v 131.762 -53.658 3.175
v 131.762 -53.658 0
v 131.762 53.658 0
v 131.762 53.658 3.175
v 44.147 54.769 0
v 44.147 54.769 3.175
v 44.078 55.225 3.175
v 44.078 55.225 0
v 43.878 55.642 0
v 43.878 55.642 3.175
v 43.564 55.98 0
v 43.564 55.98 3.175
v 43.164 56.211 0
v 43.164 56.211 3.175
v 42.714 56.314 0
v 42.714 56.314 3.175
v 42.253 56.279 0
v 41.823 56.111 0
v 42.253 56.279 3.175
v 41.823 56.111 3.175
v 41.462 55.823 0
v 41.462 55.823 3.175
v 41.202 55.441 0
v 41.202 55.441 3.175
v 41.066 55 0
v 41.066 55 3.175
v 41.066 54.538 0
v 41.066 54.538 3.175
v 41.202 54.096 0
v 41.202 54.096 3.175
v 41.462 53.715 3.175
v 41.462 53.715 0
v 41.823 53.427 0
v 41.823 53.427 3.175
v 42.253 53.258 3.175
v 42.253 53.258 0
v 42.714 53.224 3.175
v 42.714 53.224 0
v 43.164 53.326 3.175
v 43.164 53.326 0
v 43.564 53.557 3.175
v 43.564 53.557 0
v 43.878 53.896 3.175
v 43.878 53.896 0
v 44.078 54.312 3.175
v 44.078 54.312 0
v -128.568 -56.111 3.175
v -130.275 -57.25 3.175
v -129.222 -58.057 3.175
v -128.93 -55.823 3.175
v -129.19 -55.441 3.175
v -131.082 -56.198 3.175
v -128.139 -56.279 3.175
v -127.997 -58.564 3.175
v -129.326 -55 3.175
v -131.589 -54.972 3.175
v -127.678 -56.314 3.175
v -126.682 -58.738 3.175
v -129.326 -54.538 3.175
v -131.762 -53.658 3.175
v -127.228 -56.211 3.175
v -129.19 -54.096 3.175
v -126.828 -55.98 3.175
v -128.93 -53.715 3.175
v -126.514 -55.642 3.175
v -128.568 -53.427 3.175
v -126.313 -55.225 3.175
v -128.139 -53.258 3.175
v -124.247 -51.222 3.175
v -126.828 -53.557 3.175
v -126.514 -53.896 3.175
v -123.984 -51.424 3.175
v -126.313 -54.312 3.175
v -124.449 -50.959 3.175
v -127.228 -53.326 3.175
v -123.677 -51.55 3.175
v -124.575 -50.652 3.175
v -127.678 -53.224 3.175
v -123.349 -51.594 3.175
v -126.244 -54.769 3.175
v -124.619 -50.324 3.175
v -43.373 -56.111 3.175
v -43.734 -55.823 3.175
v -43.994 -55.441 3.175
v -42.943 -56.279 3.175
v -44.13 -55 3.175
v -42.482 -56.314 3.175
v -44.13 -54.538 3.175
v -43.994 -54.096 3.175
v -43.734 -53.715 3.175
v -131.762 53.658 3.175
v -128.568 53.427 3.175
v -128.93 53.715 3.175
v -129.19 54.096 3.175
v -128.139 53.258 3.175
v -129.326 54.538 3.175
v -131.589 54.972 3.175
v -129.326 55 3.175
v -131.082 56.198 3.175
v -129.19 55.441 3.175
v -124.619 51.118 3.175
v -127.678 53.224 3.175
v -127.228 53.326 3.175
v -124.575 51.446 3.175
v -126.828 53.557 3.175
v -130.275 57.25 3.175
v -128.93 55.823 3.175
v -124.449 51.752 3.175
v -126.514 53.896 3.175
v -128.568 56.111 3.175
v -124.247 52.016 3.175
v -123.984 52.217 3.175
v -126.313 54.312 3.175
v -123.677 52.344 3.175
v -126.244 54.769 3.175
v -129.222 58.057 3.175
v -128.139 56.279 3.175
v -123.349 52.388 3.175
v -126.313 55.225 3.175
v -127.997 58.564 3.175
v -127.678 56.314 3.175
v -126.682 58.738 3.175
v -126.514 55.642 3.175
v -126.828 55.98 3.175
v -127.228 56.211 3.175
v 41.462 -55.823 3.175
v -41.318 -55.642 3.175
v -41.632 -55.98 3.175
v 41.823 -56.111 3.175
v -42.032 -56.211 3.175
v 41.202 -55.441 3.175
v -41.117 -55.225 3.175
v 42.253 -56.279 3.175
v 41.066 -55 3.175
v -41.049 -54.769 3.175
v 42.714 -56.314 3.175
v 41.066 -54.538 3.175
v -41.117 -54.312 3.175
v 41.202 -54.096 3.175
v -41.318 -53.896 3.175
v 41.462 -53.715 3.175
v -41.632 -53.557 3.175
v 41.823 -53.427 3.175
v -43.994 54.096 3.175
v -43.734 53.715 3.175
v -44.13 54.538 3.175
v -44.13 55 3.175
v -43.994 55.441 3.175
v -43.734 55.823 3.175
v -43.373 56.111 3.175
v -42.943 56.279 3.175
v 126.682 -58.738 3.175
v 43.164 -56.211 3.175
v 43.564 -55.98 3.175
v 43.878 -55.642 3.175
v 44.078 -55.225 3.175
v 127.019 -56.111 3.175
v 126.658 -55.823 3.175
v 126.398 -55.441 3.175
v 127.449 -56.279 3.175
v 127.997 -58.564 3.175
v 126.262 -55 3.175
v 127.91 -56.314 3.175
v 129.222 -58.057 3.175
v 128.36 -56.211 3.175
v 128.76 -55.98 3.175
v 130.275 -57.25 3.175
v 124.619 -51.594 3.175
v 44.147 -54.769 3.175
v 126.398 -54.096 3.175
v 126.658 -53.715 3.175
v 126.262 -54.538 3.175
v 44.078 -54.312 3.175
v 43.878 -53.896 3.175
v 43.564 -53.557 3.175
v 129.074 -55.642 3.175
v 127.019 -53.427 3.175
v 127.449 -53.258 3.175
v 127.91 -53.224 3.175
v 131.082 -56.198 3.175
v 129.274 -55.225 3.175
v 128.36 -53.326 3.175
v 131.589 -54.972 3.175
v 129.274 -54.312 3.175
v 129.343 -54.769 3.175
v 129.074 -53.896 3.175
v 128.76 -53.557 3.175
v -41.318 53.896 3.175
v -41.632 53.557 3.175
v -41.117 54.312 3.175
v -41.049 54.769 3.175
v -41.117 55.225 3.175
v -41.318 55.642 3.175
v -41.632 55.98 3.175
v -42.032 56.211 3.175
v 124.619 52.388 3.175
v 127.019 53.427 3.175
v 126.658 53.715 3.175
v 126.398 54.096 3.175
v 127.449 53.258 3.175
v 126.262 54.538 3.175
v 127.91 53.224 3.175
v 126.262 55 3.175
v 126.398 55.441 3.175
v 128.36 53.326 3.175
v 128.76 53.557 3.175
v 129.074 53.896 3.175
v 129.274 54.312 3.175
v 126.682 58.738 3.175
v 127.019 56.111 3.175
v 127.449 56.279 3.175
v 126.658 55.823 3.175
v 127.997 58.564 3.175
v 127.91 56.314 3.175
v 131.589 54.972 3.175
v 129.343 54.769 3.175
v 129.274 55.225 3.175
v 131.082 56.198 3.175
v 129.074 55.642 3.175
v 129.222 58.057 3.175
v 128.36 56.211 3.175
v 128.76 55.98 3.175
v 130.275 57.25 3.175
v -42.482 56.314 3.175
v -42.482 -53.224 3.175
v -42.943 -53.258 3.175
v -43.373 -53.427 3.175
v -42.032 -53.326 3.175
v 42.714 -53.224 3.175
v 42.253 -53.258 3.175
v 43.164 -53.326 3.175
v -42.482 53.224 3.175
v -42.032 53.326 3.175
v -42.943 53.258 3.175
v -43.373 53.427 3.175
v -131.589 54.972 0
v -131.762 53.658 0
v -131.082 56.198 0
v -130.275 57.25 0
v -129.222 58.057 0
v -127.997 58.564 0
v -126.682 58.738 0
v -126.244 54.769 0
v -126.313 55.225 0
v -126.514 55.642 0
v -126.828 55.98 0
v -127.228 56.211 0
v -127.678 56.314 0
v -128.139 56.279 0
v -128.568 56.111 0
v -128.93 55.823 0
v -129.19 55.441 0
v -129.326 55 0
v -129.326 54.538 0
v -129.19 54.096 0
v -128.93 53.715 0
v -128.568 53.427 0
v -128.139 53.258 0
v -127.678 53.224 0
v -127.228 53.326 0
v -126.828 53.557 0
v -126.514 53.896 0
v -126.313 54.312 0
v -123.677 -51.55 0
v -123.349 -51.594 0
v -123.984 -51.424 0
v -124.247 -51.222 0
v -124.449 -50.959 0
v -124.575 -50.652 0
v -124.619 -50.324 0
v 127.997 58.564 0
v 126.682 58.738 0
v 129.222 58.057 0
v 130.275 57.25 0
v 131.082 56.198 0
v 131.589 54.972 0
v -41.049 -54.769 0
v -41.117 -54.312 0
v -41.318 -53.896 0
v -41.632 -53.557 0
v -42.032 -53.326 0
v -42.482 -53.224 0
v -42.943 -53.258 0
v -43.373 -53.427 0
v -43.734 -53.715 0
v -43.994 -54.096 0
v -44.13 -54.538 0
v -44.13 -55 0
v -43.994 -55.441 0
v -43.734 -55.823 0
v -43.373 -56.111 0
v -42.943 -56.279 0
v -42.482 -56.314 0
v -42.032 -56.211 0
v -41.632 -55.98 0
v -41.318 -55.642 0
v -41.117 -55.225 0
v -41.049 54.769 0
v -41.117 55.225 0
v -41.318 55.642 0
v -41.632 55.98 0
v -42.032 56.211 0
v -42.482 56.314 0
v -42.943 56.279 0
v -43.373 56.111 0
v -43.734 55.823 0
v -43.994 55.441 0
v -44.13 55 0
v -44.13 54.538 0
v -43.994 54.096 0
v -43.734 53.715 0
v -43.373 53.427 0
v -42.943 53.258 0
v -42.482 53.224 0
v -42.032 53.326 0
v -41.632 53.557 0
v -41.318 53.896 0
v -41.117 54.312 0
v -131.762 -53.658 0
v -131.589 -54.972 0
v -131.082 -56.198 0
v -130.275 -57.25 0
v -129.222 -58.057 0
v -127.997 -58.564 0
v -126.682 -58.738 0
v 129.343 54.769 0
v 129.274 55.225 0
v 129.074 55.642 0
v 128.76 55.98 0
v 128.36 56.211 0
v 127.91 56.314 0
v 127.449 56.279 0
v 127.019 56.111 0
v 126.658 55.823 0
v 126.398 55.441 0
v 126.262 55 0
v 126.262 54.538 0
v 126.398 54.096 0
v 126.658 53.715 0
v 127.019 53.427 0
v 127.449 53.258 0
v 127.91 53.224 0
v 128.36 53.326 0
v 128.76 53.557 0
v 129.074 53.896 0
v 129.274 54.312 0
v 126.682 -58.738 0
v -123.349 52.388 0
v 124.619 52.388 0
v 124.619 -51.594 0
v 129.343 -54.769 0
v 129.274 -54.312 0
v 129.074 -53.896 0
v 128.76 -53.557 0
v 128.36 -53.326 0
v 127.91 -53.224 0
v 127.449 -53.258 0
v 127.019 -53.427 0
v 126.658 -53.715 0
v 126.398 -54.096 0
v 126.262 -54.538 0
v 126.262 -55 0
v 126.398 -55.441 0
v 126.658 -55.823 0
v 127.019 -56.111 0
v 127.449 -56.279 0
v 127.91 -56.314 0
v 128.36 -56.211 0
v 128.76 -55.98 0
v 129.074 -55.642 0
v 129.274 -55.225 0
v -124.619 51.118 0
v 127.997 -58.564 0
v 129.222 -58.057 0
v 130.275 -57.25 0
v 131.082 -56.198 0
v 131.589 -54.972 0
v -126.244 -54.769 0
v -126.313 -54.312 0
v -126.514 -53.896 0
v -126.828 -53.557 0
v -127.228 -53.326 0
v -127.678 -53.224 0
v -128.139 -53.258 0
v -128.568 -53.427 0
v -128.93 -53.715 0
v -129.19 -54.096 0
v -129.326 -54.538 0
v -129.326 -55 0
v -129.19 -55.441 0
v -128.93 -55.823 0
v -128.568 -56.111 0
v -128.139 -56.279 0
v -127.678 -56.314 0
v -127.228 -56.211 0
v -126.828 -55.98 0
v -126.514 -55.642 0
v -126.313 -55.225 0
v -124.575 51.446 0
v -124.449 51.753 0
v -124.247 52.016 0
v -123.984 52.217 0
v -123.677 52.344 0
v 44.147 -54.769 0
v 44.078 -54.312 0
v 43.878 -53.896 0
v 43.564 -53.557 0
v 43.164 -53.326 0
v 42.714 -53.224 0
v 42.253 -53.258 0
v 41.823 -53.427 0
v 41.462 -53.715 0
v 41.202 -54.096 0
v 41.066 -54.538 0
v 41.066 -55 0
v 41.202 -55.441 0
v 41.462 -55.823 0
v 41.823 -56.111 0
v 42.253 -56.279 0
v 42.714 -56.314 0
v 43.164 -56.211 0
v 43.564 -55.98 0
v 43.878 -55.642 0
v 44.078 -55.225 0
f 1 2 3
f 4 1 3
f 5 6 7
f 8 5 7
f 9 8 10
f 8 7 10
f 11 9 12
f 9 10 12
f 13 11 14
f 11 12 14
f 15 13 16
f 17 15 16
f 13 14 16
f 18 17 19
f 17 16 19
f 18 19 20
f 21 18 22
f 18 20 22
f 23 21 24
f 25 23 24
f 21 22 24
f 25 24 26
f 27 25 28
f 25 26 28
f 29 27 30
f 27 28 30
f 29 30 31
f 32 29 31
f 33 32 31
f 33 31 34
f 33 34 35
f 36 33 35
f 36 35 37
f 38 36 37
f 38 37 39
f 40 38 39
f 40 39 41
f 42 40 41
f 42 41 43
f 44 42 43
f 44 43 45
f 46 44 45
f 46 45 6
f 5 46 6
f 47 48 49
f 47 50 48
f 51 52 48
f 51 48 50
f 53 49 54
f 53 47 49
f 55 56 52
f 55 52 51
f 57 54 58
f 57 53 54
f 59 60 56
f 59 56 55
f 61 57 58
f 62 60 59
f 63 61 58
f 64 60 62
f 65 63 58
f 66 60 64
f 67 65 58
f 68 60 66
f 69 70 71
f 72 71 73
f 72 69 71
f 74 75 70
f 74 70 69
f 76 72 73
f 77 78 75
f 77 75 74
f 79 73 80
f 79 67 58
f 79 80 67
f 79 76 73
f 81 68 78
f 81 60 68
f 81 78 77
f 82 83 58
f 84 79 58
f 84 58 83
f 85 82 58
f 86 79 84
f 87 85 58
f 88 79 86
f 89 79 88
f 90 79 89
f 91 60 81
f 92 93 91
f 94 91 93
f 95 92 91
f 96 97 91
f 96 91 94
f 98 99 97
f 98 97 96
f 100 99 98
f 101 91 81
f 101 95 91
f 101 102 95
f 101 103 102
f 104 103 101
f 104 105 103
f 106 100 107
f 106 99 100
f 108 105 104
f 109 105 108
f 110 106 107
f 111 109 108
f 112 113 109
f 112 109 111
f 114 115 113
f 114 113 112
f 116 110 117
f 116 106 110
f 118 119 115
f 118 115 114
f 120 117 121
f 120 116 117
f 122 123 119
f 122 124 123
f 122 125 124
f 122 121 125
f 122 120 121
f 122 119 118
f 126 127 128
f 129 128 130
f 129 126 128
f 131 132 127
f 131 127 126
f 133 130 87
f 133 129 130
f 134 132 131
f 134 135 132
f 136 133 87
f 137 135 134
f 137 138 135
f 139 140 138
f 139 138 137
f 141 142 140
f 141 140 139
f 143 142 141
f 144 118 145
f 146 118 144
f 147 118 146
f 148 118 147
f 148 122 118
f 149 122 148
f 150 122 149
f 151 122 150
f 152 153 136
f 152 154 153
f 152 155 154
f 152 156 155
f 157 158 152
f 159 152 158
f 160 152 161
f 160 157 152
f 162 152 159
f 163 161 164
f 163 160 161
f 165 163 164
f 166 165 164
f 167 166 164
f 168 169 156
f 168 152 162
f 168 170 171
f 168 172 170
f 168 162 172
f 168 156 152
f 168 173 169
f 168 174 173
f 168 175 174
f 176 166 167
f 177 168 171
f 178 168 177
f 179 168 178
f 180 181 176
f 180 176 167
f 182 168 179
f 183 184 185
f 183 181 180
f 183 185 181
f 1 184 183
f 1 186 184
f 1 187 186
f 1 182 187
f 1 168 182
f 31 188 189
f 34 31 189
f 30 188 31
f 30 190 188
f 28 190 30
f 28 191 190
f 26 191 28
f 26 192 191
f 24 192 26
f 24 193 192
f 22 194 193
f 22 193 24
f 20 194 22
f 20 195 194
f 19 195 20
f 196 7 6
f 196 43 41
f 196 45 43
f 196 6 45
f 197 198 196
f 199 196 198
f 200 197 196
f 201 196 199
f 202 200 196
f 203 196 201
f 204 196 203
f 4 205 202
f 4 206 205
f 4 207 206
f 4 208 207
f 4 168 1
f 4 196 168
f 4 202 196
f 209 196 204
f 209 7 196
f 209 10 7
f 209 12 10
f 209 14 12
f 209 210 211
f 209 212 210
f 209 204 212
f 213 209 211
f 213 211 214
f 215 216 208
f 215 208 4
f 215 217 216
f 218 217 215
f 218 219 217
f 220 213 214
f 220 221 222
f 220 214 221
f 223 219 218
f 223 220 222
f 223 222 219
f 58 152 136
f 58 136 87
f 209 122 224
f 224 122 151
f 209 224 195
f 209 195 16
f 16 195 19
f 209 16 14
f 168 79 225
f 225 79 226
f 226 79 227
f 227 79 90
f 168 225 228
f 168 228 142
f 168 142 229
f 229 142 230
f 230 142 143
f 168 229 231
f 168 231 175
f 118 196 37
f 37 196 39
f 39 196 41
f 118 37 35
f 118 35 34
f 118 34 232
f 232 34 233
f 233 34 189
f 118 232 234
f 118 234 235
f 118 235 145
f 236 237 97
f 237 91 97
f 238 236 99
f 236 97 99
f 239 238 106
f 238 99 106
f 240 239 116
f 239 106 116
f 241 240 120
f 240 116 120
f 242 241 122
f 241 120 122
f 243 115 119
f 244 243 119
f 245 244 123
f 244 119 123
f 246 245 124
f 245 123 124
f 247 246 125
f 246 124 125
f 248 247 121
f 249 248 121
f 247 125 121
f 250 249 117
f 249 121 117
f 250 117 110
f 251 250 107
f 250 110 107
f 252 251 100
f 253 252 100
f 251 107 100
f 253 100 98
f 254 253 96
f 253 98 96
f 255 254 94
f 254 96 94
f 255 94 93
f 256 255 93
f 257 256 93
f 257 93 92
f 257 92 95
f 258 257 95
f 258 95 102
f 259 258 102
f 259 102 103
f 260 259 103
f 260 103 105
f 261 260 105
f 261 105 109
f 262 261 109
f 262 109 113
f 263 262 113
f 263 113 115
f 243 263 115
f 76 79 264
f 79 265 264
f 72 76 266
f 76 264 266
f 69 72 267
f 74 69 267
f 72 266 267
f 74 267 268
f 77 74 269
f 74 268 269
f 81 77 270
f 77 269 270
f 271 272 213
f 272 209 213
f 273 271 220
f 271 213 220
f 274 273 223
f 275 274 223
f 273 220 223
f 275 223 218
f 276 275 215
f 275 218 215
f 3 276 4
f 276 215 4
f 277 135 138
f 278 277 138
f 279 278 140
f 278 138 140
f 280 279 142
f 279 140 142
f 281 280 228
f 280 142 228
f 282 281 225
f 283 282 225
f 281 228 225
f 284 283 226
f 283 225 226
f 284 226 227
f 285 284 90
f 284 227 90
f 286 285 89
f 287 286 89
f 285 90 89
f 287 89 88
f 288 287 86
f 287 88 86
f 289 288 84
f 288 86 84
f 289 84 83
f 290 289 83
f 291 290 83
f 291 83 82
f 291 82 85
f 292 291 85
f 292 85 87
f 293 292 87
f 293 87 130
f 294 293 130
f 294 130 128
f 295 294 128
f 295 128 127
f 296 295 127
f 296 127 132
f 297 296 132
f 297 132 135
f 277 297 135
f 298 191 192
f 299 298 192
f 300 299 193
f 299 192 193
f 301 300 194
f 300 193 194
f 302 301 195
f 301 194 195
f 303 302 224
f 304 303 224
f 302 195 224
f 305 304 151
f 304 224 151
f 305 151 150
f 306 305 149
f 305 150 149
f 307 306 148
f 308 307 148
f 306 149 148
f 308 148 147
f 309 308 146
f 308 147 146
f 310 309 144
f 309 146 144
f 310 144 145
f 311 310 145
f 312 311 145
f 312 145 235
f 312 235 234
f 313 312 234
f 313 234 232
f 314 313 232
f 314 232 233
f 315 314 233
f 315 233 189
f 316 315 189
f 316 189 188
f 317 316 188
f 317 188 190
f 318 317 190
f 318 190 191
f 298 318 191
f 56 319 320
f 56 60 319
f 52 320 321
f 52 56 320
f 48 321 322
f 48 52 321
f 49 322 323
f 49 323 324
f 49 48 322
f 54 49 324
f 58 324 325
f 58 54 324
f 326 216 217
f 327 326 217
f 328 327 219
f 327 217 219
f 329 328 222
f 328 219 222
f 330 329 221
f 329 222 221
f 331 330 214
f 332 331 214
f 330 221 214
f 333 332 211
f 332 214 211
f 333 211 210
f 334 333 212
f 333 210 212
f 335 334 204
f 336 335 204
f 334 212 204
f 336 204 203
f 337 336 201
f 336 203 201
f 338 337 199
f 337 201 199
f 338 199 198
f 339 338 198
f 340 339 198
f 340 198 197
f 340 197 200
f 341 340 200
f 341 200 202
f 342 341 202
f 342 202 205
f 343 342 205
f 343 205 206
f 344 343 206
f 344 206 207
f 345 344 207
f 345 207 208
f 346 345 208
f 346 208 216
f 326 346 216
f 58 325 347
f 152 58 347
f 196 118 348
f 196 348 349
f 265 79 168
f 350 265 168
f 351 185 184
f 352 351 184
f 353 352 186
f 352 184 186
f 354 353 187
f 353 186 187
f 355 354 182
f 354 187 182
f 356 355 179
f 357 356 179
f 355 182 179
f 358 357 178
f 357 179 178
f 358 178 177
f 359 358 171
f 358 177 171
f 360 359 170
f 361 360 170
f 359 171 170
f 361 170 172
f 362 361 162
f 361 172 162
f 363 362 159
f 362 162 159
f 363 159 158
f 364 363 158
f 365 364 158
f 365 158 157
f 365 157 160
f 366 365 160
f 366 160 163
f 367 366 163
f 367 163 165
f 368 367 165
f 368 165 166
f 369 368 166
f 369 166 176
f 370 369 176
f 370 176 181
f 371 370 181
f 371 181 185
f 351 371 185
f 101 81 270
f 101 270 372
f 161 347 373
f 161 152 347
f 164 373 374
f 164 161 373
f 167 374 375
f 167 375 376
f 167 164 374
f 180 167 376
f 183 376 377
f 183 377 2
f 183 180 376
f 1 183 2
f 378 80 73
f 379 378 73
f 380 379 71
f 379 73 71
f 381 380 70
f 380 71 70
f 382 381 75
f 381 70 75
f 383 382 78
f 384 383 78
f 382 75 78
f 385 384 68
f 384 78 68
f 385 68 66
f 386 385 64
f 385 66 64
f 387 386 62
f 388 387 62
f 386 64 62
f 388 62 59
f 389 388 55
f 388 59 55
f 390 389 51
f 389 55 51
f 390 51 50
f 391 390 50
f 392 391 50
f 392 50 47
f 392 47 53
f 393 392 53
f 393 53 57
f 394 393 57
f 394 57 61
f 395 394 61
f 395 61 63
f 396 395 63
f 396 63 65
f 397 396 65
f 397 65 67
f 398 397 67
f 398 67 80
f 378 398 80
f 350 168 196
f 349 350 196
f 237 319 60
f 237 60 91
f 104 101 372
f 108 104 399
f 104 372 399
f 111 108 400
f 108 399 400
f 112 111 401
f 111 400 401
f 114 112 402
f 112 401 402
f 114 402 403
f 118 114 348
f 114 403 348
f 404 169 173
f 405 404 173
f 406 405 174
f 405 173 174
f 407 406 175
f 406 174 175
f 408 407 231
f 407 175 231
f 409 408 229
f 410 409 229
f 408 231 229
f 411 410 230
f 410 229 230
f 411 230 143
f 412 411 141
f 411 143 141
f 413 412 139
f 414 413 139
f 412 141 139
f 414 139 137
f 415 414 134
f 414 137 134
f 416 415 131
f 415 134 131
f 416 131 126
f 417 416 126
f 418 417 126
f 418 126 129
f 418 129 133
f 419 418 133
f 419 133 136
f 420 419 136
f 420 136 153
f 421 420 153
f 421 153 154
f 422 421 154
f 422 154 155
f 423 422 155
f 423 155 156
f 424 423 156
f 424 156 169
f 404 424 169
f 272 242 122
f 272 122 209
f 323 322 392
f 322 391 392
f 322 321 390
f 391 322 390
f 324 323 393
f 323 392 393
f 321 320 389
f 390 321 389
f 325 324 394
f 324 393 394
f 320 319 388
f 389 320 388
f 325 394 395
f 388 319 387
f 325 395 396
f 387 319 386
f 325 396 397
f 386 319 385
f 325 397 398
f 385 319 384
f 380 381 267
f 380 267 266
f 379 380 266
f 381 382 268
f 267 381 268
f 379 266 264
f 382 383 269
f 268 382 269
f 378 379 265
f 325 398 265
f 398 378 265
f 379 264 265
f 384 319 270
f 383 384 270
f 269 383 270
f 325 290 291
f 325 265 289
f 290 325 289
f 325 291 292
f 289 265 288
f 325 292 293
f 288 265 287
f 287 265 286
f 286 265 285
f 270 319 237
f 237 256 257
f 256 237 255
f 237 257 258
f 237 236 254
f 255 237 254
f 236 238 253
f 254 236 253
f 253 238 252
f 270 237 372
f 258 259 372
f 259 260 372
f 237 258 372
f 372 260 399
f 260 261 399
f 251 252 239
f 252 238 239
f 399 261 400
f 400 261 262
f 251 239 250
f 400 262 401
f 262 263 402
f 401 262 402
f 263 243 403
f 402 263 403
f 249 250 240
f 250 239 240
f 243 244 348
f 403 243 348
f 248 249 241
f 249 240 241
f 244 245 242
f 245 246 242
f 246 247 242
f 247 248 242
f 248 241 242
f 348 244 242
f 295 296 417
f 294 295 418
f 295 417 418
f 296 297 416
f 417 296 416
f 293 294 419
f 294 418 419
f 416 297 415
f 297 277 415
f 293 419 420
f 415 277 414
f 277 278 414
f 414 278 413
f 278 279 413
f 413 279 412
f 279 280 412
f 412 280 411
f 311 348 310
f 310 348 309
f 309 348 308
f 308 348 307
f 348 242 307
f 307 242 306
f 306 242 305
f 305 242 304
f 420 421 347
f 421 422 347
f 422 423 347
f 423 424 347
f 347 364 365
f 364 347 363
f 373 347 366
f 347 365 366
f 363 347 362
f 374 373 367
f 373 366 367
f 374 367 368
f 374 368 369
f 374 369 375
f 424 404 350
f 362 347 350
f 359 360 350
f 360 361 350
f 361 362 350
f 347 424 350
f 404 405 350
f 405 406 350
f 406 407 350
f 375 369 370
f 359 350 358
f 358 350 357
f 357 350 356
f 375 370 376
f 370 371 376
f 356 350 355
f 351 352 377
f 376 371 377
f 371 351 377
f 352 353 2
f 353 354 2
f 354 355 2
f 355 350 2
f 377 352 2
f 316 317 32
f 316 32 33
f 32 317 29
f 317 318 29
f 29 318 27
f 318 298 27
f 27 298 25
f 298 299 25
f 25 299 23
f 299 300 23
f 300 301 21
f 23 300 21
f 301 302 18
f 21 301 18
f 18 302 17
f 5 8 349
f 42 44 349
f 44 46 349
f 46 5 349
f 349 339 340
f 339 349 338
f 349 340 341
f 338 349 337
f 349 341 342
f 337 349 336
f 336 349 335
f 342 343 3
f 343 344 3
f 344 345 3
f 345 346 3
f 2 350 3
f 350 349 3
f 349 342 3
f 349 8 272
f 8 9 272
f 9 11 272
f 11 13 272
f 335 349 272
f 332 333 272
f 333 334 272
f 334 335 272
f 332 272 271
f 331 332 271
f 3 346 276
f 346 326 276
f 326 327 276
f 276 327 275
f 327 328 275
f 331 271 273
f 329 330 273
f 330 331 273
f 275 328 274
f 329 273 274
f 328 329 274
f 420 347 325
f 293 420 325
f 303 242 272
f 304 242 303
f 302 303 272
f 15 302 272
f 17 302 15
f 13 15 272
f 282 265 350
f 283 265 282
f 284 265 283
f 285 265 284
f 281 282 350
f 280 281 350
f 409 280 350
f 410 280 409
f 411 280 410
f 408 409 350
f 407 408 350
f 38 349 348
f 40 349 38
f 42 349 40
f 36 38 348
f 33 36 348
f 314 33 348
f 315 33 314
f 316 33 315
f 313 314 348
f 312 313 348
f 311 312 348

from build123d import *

# Parameters (mm, degrees)
SKETCH_W     = 263.525
SKETCH_H     = 117.475
PAD_DEPTH    = 3.175
SKETCH002_W  = 249.2375
SKETCH002_H  = 103.98125
POCKET_DEPTH = 3.176
SKETCH001_R  = 1.5494
HOLE_DEPTH   = 3.176
FILLET_R     = 5.08
FILLET001_R  = 1.27


with BuildPart() as part:
    # Sketch → Pad (new body)
    with BuildSketch(Plane.XY):
        Rectangle(SKETCH_W, SKETCH_H)
    extrude(amount=PAD_DEPTH)

    # Sketch002 (on Face6 of Pad) → Pocket (cut, through all)
    with BuildSketch(Plane.XY.offset(3.175)):
        with Locations((0, 0.396875)):
            Rectangle(SKETCH002_W, SKETCH002_H)
    extrude(amount=-POCKET_DEPTH, mode=Mode.SUBTRACT)

    # Sketch001 (on Face6 of Pad) → Hole (cut, through all)
    with BuildSketch(Plane.XY.offset(3.175)):
        with Locations((-42.597917, 54.76875)):
            Circle(SKETCH001_R)
        with Locations((42.597917, 54.76875)):
            Circle(SKETCH001_R)
        with Locations((42.597917, -54.76875)):
            Circle(SKETCH001_R)
        with Locations((-42.597917, -54.76875)):
            Circle(SKETCH001_R)
        with Locations((-127.79375, -54.76875)):
            Circle(SKETCH001_R)
        with Locations((-127.79375, 54.76875)):
            Circle(SKETCH001_R)
        with Locations((127.79375, 54.76875)):
            Circle(SKETCH001_R)
        with Locations((127.79375, -54.76875)):
            Circle(SKETCH001_R)
    extrude(amount=-HOLE_DEPTH, mode=Mode.SUBTRACT)

    # Fillet
    fillet_edges = [part.edges().sort_by_distance(p)[0] for p in [
        (-131.7625, 58.7375, 1.5875),
        (-131.7625, -58.7375, 1.5875),
        (131.7625, -58.7375, 1.5875),
        (131.7625, 58.7375, 1.5875),
    ]]
    fillet(fillet_edges, radius=FILLET_R)

    # Fillet001
    fillet001_edges = [part.edges().sort_by_distance(p)[0] for p in [
        (-124.61875, -51.59375, 1.5875),
        (-41.048517, 54.76875, 1.5875),
        (-126.24435, 54.76875, 1.5875),
        (-124.61875, 52.3875, 1.5875),
    ]]
    fillet(fillet001_edges, radius=FILLET001_R)


solid = part.part
